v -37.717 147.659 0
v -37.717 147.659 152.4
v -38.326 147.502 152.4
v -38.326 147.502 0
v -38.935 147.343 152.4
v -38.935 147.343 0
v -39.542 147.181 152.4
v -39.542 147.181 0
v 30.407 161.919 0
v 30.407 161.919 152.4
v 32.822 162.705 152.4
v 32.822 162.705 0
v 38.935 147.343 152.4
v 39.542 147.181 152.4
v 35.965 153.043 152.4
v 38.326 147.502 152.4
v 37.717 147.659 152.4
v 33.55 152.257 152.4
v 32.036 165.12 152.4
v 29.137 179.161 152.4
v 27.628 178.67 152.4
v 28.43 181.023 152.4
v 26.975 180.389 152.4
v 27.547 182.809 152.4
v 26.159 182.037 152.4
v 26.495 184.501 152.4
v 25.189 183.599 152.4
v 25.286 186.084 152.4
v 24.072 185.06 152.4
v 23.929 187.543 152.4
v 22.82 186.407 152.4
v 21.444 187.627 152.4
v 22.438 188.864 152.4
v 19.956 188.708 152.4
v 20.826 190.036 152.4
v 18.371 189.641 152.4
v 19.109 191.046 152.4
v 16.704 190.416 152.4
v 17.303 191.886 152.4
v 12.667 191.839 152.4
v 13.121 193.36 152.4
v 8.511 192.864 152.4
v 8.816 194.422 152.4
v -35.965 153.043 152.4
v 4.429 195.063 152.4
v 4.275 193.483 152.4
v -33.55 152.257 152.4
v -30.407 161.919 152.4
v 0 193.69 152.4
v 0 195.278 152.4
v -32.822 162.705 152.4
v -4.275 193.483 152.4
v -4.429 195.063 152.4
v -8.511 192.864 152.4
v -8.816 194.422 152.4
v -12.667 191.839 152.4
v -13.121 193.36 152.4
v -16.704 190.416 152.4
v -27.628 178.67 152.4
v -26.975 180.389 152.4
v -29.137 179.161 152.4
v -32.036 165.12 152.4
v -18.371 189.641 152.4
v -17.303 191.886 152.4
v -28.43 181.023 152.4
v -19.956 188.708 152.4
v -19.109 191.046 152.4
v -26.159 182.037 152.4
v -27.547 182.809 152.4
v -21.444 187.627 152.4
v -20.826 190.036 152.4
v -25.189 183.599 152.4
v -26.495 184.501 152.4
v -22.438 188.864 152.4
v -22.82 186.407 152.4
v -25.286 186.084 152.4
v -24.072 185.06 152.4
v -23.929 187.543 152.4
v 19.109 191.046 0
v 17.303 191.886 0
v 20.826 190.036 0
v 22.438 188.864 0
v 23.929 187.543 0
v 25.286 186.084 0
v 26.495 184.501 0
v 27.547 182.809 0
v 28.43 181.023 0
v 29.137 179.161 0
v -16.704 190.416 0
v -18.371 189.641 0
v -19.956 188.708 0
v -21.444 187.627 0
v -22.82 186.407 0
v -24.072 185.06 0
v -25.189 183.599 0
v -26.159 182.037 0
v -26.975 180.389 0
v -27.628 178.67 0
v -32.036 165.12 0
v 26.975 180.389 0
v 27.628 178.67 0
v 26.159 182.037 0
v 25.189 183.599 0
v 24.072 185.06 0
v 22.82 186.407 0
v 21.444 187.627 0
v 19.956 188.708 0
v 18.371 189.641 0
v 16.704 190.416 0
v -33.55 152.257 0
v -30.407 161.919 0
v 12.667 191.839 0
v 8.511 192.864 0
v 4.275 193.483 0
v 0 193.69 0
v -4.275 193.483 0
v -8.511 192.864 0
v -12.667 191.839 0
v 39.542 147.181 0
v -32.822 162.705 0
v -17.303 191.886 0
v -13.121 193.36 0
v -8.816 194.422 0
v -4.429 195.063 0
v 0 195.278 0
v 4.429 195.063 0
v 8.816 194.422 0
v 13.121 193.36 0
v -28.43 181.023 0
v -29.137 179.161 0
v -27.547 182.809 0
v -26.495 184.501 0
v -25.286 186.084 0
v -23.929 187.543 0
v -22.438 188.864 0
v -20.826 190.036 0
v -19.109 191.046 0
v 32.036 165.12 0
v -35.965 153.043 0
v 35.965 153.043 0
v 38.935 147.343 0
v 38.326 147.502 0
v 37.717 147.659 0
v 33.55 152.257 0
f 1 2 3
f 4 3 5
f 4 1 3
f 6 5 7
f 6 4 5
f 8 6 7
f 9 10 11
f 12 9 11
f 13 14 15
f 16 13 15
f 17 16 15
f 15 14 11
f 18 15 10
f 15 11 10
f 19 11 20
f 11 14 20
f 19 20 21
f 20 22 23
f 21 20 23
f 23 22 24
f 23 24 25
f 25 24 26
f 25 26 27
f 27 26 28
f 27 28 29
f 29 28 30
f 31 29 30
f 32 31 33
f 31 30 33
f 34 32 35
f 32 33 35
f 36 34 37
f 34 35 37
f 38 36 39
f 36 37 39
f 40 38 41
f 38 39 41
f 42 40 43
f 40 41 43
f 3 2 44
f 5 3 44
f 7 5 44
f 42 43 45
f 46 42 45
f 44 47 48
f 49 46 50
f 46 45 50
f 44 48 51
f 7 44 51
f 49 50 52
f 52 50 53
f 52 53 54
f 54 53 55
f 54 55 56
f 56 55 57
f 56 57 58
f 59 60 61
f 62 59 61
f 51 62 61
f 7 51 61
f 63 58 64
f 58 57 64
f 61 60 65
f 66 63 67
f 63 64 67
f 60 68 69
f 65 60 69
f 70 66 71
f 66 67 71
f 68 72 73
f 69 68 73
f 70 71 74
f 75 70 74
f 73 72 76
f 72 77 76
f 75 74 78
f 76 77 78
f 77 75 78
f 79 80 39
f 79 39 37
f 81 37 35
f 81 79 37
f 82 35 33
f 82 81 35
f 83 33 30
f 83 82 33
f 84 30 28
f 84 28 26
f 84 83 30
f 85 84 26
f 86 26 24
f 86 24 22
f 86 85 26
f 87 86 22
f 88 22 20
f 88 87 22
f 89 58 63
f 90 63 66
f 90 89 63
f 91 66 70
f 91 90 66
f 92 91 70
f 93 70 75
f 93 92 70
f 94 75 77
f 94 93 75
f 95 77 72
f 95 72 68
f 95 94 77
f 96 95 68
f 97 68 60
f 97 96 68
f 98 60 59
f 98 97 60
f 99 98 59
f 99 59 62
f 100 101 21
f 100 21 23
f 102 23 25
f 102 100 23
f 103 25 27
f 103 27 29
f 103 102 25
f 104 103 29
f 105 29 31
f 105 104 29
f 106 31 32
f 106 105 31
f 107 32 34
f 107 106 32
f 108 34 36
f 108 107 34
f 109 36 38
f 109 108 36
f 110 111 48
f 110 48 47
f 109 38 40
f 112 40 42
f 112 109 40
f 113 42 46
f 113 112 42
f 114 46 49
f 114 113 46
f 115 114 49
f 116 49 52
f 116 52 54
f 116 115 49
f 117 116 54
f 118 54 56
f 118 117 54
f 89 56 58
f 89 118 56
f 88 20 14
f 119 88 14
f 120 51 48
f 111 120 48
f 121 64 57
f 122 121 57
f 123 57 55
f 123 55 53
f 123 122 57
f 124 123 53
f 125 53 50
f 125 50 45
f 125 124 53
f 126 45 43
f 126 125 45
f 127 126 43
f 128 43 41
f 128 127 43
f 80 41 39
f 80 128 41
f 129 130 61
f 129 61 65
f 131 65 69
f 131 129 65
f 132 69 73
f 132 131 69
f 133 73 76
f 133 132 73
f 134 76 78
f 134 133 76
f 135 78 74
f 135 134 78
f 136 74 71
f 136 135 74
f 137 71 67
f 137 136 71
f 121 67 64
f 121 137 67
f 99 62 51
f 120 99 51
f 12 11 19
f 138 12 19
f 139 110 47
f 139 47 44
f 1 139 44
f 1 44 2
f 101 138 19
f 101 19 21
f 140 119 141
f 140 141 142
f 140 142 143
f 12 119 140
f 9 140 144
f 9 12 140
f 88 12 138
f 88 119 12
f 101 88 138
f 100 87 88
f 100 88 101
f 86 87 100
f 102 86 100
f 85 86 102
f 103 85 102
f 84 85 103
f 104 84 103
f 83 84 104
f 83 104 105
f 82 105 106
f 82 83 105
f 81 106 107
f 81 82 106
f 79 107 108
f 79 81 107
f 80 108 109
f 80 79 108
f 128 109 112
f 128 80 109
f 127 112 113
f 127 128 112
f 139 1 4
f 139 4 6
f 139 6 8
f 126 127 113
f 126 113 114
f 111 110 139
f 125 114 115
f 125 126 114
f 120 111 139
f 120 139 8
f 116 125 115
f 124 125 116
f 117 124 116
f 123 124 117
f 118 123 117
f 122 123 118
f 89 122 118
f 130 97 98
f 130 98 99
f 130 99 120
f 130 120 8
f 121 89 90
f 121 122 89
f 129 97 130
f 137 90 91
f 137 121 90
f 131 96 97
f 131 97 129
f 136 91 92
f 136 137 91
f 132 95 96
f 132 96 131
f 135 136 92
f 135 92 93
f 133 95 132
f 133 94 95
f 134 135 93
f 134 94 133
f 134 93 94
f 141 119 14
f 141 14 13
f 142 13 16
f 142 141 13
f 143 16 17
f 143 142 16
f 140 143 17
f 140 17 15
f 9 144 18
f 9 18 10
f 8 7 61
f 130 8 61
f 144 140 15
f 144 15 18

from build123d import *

# Parameters (mm, degrees)
BOSS_EXTRUDE2_DEPTH = 152.4


with BuildPart() as part:
    # Sketch1 → Boss-Extrude2 (new body)
    with BuildSketch(Plane.XY):
        with BuildLine():
            Line((37.717239544, 147.658964649), (35.965487423, 153.043027332))
            Line((35.965487423, 153.043027332), (33.550115758, 152.257164929))
            Line((33.550115758, 152.257164929), (30.406666146, 161.918651592))
            Line((30.406666146, 161.918651592), (32.822037812, 162.704513995))
            Line((32.822037812, 162.704513995), (32.036175409, 165.119885661))
            Line((32.036175409, 165.119885661), (27.627587493, 178.669812847))
            ThreePointArc((27.627587493, 178.669812847), (23.462294361, 185.748899875), (16.703713988, 190.41631151))
            ThreePointArc((16.703713988, 190.41631151), (0, 193.690277018), (-16.703713988, 190.41631151))
            ThreePointArc((-16.703713988, 190.41631151), (-23.462294361, 185.748899875), (-27.627587493, 178.669812847))
            Line((-27.627587493, 178.669812847), (-32.036175409, 165.119885661))
            Line((-32.036175409, 165.119885661), (-32.822037812, 162.704513995))
            Line((-32.822037812, 162.704513995), (-30.406666146, 161.918651592))
            Line((-30.406666146, 161.918651592), (-33.550115758, 152.257164929))
            Line((-33.550115758, 152.257164929), (-35.965487423, 153.043027332))
            Line((-35.965487423, 153.043027332), (-37.717239544, 147.658964649))
            ThreePointArc((-37.717239544, 147.658964649), (-38.630482432, 147.422677452), (-39.542245278, 147.180742077))
            Line((-39.542245278, 147.180742077), (-29.137194784, 179.160976849))
            ThreePointArc((-29.137194784, 179.160976849), (-24.624793891, 186.829987796), (-17.302998471, 191.886350359))
            ThreePointArc((-17.302998471, 191.886350359), (0, 195.277776974), (17.302998471, 191.886350359))
            ThreePointArc((17.302998471, 191.886350359), (24.624793891, 186.829987796), (29.137194784, 179.160976849))
            Line((29.137194784, 179.160976849), (39.542245278, 147.180742077))
            ThreePointArc((39.542245278, 147.180742077), (38.630482432, 147.422677452), (37.717239544, 147.658964649))
        make_face()
    extrude(amount=BOSS_EXTRUDE2_DEPTH)


solid = part.part
